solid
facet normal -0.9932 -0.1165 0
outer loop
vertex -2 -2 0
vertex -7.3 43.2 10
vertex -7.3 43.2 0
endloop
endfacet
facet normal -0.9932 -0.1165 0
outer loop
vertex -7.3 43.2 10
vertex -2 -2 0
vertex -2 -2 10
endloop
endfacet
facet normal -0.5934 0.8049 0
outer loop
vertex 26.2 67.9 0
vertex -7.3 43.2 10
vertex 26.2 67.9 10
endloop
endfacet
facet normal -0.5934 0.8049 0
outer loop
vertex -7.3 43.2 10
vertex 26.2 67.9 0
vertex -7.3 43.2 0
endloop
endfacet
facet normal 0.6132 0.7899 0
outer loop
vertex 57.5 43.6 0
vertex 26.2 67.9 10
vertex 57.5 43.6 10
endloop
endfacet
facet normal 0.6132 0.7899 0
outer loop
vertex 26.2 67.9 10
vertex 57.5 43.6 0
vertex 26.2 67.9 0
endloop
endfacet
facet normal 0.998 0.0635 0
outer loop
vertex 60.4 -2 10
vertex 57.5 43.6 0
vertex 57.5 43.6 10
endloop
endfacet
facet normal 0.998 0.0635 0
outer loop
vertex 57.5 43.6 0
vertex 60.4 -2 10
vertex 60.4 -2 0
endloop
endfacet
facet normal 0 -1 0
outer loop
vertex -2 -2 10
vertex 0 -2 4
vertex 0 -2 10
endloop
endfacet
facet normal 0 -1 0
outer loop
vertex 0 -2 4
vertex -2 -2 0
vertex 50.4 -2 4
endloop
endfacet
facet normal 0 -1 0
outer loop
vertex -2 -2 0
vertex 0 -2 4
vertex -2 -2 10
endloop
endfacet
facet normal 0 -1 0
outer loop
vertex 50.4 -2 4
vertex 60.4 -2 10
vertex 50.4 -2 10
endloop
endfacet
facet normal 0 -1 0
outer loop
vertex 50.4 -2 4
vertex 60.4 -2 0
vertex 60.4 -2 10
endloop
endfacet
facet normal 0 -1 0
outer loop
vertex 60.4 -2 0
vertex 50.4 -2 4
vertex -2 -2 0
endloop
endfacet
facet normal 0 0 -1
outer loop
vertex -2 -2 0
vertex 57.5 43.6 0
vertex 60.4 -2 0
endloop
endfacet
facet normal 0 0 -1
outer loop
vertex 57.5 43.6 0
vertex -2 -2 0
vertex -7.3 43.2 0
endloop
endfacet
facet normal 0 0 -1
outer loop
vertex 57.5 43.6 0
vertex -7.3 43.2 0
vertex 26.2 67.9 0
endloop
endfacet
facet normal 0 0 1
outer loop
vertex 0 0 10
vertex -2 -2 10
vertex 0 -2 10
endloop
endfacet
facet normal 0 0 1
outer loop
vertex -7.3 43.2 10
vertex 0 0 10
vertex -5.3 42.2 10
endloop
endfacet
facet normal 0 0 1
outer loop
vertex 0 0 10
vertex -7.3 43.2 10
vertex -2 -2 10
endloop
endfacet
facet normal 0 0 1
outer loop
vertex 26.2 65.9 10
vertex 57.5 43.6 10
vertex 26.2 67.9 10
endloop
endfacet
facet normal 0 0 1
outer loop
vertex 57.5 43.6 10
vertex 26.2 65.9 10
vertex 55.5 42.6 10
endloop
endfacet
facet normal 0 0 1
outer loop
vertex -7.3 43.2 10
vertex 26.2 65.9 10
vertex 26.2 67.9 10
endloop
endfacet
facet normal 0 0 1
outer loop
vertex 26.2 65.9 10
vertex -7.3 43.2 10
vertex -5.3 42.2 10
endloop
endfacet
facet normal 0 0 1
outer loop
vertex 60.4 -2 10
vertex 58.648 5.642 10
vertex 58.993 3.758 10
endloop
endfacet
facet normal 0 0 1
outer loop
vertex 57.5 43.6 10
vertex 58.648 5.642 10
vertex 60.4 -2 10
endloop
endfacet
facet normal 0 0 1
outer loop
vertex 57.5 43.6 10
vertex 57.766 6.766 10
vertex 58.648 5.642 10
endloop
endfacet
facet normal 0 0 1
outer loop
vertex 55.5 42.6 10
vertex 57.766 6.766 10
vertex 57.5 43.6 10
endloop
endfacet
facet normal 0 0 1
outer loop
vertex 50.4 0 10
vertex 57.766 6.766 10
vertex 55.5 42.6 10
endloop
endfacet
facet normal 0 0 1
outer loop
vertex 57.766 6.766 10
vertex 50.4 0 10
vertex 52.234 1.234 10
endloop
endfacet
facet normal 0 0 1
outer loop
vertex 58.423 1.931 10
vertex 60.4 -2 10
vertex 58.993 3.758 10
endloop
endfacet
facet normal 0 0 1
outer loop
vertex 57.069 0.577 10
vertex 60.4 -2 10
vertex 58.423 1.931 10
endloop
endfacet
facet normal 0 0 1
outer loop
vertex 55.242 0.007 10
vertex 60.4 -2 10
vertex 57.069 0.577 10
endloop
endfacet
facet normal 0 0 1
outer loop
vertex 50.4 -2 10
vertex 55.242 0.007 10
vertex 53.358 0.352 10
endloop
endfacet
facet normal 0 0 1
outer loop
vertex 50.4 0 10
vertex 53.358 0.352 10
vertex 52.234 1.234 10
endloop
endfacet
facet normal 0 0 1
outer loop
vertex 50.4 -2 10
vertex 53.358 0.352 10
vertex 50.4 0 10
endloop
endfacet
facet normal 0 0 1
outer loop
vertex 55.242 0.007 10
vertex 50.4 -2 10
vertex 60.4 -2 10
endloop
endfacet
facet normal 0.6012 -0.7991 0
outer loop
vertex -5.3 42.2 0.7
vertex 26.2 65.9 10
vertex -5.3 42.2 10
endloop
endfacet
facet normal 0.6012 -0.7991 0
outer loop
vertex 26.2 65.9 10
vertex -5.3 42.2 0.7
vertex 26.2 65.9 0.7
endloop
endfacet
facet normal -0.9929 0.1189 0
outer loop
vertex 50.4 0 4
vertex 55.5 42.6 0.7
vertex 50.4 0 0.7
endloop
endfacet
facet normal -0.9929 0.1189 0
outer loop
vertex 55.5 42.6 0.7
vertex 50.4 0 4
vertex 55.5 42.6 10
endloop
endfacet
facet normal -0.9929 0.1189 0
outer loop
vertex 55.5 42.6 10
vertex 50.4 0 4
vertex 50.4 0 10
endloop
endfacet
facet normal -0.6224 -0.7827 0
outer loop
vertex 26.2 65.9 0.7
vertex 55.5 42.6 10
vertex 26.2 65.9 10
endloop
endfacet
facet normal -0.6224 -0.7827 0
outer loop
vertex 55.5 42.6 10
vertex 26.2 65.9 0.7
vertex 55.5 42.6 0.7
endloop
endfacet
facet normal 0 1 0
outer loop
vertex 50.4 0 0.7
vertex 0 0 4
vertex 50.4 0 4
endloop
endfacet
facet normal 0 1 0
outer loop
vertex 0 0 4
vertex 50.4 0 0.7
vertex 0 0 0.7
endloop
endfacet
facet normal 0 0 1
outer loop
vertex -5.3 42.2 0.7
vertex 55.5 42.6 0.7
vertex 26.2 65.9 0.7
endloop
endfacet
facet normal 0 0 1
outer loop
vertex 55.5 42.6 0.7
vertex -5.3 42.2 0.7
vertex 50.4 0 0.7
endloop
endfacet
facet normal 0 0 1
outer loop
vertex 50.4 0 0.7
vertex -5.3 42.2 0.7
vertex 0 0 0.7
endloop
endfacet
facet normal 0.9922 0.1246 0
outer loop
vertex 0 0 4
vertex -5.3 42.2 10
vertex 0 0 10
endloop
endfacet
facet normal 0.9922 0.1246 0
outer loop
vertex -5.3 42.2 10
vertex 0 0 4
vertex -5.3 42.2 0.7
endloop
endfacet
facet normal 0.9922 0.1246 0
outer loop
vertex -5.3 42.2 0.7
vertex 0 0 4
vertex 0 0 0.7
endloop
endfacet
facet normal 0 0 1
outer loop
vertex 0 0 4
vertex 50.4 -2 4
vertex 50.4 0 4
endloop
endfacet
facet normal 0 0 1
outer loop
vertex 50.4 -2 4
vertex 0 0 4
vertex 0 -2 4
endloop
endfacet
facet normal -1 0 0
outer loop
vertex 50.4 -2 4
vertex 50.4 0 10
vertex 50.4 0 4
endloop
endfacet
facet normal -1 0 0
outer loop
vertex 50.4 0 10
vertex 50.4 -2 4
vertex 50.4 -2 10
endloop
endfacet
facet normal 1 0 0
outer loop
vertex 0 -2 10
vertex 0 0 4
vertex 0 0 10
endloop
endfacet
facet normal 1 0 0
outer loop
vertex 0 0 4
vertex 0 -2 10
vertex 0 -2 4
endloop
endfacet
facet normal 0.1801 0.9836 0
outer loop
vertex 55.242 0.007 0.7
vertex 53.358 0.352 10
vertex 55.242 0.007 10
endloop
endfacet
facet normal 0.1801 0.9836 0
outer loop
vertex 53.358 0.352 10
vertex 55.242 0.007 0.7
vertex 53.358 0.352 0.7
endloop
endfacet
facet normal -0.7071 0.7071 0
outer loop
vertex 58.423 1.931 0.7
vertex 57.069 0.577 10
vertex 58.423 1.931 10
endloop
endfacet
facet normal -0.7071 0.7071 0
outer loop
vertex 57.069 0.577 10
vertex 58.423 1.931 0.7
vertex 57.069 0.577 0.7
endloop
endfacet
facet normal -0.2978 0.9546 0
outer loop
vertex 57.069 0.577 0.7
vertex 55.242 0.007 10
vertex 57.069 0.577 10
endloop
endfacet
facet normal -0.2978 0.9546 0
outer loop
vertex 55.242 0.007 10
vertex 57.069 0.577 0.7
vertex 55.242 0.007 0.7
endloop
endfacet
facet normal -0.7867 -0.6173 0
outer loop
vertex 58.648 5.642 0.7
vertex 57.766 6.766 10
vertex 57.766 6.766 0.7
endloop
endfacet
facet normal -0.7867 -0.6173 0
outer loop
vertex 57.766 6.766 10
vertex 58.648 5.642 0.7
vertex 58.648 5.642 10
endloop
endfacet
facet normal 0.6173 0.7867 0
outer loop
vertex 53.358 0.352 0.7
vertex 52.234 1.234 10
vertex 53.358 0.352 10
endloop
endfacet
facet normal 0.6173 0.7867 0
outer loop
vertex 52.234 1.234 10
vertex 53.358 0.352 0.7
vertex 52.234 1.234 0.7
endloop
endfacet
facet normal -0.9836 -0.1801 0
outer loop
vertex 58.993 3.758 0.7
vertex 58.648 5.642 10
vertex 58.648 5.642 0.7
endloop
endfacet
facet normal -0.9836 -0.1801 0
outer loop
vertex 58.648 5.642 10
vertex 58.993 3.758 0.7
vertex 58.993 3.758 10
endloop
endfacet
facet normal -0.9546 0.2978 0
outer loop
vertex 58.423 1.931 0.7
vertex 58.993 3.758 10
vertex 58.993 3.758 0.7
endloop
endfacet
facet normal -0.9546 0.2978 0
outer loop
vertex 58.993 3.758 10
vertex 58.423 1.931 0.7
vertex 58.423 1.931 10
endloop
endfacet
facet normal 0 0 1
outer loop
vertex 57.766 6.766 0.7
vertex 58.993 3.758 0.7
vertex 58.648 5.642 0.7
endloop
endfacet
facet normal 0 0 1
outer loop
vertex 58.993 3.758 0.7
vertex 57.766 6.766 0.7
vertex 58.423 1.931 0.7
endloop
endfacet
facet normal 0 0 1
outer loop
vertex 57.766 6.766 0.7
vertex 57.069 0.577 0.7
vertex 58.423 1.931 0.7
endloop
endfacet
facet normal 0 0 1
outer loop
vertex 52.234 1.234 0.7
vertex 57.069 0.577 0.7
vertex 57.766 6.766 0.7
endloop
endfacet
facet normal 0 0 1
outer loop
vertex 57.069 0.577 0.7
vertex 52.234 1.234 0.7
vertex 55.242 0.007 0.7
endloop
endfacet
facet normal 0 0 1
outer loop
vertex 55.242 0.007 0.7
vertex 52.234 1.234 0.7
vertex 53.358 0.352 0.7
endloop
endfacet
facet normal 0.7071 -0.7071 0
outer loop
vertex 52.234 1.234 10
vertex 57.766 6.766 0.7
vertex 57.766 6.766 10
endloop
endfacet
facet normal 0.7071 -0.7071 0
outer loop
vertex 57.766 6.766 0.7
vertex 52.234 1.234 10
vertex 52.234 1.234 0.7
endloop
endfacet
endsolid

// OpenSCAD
// file: lib.scad
module halfCylinder(r,h) {
  e=.02;
  difference(){
    cylinder(h,r,r);
    translate ([0,-(r+e),-e])
      cube([2*(r+e),2*(r+e),h+2*e]);
  };    
};

module winner(text,x,y,z,fontSize,extrusionHeight) {
  translate([x,y,z])
    linear_extrude(height=extrusionHeight)
      text(text,size=fontSize,halign="left");
};
// main file
include <lib.scad>

difference() {
    difference() {
        difference() {
            linear_extrude(10) {
                polygon(points = [
                        [-2, -2],
                        [60.4, -2],
                        [57.5, 43.6],
                        [26.2, 67.9],
                        [-7.3, 43.2],
                        [-2, -2]]);
            };
            translate([0, 0, .7]) {
                linear_extrude(10) {
                    polygon(points = [
                            [0, 0],
                            [50.4, 0],
                            [55.5, 42.6],
                            [26.2, 65.9],
                            [-5.3, 42.2],
                            [0, 0]]);
                };
            };
        };

        translate([0, 0, 4]) {
            linear_extrude(8) {
                polygon(points = [
                        [0, 0],
                        [50.4, 0],
                        [50.4, -2],
                        [0, -2],
                        [0, 0]]);
            };
        };
    };

    translate([55, 4, .7])
        rotate([0, 0, -225])
            halfCylinder(4, 10);
};
